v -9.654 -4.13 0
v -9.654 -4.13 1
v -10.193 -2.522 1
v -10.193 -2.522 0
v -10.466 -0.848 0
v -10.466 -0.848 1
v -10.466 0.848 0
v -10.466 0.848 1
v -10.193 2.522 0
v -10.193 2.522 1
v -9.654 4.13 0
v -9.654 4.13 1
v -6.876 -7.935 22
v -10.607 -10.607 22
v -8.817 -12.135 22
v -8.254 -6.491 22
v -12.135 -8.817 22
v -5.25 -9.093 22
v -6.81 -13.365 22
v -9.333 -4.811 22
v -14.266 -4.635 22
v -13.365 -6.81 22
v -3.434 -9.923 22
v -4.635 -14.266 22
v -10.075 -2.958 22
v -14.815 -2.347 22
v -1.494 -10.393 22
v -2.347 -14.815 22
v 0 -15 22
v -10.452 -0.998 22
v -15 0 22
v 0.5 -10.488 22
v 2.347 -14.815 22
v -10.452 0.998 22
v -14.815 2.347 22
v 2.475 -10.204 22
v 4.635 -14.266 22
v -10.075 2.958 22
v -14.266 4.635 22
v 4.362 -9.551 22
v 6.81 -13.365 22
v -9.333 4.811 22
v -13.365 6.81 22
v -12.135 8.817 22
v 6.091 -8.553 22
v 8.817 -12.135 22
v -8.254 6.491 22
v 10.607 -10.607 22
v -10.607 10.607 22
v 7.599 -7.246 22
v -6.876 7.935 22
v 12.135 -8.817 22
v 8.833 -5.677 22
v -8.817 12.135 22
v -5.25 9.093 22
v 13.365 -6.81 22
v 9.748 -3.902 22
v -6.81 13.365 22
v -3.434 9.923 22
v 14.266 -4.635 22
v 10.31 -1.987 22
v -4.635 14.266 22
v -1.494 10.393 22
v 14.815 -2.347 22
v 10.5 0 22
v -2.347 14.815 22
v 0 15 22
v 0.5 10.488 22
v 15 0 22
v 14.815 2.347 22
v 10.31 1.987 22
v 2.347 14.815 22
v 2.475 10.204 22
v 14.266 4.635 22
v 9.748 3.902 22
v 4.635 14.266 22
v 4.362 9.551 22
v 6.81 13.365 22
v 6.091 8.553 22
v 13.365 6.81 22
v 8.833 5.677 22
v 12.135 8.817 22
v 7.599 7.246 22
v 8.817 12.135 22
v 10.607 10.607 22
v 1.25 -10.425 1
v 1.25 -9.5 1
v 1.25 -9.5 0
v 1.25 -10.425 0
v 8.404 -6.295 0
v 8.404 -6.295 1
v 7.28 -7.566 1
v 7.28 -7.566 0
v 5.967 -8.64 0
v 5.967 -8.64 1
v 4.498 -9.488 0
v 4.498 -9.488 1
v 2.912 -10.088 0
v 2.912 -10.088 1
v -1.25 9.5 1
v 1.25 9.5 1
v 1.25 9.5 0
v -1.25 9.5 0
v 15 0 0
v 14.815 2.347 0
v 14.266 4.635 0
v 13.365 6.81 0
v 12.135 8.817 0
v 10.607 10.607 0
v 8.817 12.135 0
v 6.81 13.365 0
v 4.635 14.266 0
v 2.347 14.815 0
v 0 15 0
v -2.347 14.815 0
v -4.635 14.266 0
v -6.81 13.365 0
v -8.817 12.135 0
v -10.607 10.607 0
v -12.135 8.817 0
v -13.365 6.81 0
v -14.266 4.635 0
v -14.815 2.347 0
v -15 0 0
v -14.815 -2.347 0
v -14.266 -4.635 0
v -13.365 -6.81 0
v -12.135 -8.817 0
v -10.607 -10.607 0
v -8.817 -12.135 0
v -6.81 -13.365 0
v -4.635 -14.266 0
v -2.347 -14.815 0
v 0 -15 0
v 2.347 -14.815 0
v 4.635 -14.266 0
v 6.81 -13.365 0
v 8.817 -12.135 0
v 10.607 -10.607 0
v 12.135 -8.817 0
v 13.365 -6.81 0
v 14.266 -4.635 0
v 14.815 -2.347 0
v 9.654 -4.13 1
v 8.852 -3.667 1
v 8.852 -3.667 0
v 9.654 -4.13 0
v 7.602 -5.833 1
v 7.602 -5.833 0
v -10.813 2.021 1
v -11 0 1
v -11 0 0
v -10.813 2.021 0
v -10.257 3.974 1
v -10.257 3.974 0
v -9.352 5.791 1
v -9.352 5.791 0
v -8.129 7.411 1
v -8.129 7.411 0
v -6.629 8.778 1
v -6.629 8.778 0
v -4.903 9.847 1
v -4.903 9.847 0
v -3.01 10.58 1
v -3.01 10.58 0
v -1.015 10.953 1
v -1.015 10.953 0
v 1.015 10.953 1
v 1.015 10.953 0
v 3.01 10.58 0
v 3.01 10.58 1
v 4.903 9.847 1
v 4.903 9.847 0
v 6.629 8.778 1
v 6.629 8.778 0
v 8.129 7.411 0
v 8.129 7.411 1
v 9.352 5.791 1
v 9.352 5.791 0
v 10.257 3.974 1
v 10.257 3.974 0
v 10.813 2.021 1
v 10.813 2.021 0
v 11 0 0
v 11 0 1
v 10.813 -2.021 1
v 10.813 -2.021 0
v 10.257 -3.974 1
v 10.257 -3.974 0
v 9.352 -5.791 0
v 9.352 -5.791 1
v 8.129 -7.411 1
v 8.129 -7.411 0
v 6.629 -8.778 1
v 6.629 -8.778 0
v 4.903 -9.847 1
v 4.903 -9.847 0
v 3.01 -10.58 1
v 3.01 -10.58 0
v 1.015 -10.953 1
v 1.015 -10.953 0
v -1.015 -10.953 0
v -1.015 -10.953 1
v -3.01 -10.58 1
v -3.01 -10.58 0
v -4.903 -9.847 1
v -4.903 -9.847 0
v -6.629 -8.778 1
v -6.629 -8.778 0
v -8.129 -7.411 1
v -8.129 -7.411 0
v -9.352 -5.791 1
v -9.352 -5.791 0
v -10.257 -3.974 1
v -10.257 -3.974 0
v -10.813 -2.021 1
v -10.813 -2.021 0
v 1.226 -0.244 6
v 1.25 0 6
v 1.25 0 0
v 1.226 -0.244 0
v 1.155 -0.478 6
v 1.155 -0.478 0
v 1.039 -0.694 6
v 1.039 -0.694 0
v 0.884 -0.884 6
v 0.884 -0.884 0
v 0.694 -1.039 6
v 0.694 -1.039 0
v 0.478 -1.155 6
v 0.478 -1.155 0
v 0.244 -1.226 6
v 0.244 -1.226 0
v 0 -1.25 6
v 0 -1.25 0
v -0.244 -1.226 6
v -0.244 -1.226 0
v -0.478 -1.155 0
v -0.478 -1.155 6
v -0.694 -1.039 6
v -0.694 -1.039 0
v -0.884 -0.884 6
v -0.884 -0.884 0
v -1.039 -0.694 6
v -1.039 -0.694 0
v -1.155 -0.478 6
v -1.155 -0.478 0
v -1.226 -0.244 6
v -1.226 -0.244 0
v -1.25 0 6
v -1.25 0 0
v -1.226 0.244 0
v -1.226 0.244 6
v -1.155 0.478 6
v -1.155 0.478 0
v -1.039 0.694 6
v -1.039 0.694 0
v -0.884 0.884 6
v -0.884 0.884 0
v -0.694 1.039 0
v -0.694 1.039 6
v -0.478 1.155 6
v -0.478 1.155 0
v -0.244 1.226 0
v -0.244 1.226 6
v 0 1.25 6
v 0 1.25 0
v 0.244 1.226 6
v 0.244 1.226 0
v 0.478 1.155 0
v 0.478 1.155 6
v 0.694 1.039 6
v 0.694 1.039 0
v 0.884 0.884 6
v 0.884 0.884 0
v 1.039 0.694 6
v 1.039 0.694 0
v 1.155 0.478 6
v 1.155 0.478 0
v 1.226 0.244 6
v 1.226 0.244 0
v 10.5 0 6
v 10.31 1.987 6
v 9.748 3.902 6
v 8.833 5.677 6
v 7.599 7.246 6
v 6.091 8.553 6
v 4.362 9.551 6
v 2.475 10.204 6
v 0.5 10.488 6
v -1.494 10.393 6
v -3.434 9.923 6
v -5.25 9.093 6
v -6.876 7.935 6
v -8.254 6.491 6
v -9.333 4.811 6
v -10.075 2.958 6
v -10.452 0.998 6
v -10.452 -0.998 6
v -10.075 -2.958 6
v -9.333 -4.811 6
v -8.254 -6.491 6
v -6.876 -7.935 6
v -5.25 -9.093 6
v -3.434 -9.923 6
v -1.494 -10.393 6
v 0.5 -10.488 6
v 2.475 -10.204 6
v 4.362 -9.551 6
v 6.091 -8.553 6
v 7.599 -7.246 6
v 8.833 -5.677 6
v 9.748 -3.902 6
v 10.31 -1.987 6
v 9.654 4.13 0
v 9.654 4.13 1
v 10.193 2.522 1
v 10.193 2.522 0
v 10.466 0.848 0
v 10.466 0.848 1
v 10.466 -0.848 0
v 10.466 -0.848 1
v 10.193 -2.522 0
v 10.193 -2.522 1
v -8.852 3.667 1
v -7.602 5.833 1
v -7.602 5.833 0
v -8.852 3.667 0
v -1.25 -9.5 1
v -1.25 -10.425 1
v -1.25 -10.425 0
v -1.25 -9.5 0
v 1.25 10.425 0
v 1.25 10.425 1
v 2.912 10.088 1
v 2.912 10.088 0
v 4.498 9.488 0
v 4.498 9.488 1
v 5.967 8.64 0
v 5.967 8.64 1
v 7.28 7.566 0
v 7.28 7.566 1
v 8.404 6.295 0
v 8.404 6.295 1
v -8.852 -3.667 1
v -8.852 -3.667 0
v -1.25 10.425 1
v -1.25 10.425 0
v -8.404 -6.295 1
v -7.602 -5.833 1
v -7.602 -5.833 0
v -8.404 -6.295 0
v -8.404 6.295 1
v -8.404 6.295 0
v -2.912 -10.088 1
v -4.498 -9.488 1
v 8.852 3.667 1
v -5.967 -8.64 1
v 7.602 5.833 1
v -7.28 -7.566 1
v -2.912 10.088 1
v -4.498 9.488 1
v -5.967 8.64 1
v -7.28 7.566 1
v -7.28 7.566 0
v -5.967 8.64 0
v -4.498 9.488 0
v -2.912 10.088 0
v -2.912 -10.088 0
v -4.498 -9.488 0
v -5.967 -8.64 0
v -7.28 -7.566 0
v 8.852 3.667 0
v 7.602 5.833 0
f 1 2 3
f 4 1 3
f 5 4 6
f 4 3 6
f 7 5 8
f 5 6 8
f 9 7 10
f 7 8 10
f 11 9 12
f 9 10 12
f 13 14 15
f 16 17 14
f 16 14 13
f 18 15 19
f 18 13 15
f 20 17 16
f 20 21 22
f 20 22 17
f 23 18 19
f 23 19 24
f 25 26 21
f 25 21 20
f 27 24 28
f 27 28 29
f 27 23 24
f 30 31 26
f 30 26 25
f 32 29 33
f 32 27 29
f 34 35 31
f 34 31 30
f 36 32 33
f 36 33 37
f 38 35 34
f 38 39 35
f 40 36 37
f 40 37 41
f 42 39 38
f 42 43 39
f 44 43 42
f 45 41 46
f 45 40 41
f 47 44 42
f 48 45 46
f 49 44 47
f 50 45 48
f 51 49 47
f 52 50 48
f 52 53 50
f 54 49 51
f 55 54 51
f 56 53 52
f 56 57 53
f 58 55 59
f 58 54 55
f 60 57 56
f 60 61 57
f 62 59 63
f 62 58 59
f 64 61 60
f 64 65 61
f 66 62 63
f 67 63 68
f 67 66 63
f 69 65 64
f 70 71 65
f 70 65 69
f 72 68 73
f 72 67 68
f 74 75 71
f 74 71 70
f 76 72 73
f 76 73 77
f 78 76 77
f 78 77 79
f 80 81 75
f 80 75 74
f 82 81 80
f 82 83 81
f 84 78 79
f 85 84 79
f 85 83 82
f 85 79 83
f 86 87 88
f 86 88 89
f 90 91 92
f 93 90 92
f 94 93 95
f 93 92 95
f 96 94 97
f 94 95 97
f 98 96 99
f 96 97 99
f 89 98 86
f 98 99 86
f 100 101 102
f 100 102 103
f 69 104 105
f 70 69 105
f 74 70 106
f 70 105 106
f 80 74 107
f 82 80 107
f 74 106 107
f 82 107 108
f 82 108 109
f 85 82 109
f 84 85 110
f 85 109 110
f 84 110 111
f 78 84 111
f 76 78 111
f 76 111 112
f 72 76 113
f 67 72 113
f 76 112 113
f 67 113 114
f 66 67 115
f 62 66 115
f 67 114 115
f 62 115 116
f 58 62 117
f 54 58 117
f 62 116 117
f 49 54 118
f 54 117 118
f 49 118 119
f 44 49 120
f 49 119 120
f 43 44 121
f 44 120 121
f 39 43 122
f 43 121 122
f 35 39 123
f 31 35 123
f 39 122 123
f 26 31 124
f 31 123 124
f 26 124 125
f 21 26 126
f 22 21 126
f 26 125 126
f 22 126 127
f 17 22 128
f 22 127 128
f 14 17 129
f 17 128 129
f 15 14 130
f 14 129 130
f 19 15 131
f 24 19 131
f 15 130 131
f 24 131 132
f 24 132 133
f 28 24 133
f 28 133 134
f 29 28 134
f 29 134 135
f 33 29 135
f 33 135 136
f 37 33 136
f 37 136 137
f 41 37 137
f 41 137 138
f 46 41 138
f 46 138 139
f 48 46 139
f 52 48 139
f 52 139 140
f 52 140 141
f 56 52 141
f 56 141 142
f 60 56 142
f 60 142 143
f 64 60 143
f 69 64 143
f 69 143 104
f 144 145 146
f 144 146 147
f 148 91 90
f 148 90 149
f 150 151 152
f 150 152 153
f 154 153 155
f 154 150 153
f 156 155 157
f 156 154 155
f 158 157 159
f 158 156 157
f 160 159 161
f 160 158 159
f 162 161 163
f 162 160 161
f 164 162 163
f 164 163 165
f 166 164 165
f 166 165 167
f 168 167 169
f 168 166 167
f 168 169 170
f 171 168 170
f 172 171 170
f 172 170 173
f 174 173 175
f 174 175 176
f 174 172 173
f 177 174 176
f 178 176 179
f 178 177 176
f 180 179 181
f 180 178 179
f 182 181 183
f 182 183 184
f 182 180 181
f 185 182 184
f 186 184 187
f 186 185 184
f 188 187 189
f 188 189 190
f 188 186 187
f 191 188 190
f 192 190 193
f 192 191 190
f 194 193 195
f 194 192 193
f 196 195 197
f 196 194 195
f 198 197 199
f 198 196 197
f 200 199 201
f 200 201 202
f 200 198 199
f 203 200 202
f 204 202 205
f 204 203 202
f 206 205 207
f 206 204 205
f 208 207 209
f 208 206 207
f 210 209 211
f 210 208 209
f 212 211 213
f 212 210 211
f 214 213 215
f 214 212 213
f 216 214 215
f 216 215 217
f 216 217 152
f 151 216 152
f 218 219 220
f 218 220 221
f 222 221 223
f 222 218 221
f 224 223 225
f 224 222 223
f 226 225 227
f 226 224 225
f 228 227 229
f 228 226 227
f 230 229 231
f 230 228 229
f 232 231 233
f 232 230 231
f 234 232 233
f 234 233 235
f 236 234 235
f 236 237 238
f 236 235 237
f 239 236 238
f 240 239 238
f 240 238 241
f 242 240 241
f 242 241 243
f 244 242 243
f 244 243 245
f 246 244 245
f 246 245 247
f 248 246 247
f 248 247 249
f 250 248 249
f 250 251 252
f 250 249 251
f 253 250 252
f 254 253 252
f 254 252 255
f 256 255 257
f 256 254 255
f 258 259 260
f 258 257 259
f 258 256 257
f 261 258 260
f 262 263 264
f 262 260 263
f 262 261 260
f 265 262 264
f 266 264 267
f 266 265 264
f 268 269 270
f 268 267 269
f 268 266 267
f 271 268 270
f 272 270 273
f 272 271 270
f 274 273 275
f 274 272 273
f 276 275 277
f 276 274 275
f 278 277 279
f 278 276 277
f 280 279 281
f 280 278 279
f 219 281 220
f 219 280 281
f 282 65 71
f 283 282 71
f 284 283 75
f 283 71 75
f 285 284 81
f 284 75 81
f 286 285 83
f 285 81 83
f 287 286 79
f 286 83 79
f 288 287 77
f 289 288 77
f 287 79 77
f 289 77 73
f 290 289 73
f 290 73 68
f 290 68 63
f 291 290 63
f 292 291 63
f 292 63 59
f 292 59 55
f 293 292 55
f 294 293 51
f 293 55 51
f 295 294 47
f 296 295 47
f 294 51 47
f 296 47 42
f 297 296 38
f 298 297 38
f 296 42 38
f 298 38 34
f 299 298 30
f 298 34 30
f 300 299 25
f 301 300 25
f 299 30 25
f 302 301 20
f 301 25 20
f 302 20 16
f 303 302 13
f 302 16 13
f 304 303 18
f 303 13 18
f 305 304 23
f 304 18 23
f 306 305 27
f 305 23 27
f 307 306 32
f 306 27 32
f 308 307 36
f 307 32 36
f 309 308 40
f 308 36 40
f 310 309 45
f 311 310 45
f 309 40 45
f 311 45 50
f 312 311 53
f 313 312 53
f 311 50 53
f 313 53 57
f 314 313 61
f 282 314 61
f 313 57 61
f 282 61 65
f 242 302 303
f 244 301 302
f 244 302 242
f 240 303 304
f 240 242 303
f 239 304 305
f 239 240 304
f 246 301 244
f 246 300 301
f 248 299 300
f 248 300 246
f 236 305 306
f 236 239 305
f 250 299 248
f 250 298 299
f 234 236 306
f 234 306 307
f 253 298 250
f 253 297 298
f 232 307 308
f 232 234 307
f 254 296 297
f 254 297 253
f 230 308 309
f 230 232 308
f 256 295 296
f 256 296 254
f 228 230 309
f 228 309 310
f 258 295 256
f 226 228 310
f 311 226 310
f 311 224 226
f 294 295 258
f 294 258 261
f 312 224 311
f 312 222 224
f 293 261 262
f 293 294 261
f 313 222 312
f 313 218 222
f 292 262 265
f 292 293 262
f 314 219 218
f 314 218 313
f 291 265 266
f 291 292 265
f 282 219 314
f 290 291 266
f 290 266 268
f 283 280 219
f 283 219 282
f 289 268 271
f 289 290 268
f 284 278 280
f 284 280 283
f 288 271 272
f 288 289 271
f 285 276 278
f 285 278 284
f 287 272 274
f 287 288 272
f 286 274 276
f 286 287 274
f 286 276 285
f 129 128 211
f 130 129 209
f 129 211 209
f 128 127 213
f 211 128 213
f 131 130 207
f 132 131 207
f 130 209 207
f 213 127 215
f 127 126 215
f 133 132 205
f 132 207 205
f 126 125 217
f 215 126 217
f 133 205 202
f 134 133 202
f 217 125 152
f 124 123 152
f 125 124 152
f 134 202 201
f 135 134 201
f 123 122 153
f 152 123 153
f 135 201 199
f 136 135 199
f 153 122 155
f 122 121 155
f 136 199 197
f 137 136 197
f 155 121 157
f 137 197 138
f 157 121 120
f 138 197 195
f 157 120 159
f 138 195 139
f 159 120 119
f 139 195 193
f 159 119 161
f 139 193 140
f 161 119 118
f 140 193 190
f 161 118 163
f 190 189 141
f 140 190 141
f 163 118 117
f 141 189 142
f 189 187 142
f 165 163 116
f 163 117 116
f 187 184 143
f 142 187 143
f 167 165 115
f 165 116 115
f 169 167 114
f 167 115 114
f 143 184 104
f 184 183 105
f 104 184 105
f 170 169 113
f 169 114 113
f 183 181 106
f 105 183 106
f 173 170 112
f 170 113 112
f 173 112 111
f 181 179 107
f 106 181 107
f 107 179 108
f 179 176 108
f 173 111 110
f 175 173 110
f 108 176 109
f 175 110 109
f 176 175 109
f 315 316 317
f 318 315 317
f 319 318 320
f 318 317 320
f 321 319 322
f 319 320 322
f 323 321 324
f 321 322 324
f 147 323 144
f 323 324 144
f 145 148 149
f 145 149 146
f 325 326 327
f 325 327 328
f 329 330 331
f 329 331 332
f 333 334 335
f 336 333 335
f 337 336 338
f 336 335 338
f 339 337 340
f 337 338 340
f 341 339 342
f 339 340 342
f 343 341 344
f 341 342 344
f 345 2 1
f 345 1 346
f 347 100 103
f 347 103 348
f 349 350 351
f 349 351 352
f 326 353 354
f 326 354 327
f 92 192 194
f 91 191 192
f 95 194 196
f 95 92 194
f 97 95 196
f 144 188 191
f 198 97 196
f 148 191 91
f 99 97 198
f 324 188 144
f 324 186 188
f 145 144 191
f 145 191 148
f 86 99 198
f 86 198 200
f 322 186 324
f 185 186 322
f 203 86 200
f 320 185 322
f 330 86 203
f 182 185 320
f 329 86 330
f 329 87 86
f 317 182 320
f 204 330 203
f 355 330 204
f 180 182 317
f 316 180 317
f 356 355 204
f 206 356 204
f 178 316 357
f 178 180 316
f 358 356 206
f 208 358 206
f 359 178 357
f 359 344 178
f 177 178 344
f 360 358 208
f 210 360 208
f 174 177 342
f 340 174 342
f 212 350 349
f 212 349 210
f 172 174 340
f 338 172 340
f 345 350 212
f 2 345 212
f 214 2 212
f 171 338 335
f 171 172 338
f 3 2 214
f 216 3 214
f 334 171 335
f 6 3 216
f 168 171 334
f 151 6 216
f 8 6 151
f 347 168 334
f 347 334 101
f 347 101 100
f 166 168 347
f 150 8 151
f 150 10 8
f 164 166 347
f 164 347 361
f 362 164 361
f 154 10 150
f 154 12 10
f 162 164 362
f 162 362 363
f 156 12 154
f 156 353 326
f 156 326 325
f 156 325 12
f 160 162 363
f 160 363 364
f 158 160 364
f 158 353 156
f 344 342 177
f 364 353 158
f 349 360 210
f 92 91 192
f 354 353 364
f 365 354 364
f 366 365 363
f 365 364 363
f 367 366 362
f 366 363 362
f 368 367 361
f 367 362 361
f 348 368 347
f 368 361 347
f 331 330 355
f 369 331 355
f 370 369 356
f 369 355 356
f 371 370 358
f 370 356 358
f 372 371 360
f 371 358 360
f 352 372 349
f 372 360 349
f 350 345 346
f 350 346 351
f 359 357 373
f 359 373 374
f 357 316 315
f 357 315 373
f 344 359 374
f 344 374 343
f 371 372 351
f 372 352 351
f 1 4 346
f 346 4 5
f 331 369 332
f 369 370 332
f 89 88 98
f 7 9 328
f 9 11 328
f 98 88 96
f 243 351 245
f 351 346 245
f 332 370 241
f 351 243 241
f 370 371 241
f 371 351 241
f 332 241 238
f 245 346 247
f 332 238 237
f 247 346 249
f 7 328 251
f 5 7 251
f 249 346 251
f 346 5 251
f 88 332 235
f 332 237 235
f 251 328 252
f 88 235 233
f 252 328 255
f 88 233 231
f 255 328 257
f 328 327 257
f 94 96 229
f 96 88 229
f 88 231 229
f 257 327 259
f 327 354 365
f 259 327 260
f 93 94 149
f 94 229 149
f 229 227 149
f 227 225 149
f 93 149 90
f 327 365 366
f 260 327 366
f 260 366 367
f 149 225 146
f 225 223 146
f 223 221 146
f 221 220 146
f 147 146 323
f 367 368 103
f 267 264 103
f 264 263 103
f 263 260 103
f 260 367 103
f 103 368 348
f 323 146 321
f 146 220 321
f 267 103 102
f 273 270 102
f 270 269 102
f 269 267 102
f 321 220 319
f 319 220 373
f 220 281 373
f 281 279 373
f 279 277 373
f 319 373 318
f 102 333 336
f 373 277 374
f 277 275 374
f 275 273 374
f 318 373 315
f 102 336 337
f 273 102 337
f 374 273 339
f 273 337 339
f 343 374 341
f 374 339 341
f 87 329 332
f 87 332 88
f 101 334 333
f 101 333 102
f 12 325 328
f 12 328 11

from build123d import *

# Parameters (mm, degrees)
CROQUIS1_R                 = 15
SALIENTE_EXTRUIR1_DEPTH    = 22
CROQUIS2_R                 = 10.5
CORTAR_EXTRUIR1_DEPTH      = 16
CORTAR_EXTRUIR2_START      = -1
CORTAR_EXTRUIR2_DEPTH      = 1
CORTAR_EXTRUIR3_START      = -1
CROQUIS5_R                 = 11
CROQUIS5_R_2               = 10.5
CORTAR_EXTRUIR3_DEPTH      = 1
CORTAR_EXTRUIR4_DEPTH      = 31.56141358
CORTAR_EXTRUIR4_DEPTH_BACK = 31.56141358
CROQUIS6_R                 = 1.25


with BuildPart() as part:
    # Croquis1 → Saliente-Extruir1 (new body)
    with BuildSketch(Plane.XY):
        Circle(CROQUIS1_R)
    extrude(amount=SALIENTE_EXTRUIR1_DEPTH)

    # Croquis2 → Cortar-Extruir1 (cut)
    with BuildSketch(Plane.XY.offset(22)):
        Circle(CROQUIS2_R)
    extrude(amount=-CORTAR_EXTRUIR1_DEPTH, mode=Mode.SUBTRACT)

    # Croquis3 → Cortar-Extruir2 (cut)
    with BuildSketch(Plane(origin=(0, 0, 0), x_dir=(-1, 0, 0), z_dir=(0, 0, -1)).offset(CORTAR_EXTRUIR2_START)):
        with BuildLine():
            ThreePointArc((1.25, 10.425329731), (0, 10.5), (-1.25, 10.425329731))
            Line((-1.25, 10.425329731), (-1.25, 9.5))
            Line((-1.25, 9.5), (1.25, 9.5))
            Line((1.25, 9.5), (1.25, 10.425329731))
        make_face()
        with BuildLine():
            Line((-7.602241336, 5.832531755), (-8.40360039, 6.29519662))
            ThreePointArc((-8.40360039, 6.29519662), (-9.09326674, 5.25), (-9.65360039, 4.130133111))
            Line((-9.65360039, 4.130133111), (-8.852241336, 3.667468245))
            Line((-8.852241336, 3.667468245), (-7.602241336, 5.832531755))
        make_face()
        with BuildLine():
            ThreePointArc((9.65360039, 4.130133111), (9.09326674, 5.25), (8.40360039, 6.29519662))
            Line((8.40360039, 6.29519662), (7.602241336, 5.832531755))
            Line((7.602241336, 5.832531755), (8.852241336, 3.667468245))
            Line((8.852241336, 3.667468245), (9.65360039, 4.130133111))
        make_face()
        with BuildLine():
            Line((-8.852241336, -3.667468245), (-9.65360039, -4.130133111))
            ThreePointArc((-9.65360039, -4.130133111), (-9.09326674, -5.25), (-8.40360039, -6.29519662))
            Line((-8.40360039, -6.29519662), (-7.602241336, -5.832531755))
            Line((-7.602241336, -5.832531755), (-8.852241336, -3.667468245))
        make_face()
        with BuildLine():
            ThreePointArc((8.40360039, -6.29519662), (9.09326674, -5.25), (9.65360039, -4.130133111))
            Line((9.65360039, -4.130133111), (8.852241336, -3.667468245))
            Line((8.852241336, -3.667468245), (7.602241336, -5.832531755))
            Line((7.602241336, -5.832531755), (8.40360039, -6.29519662))
        make_face()
        with BuildLine():
            Line((-1.25, -9.5), (-1.25, -10.425329731))
            ThreePointArc((-1.25, -10.425329731), (0, -10.5), (1.25, -10.425329731))
            Line((1.25, -10.425329731), (1.25, -9.5))
            Line((1.25, -9.5), (-1.25, -9.5))
        make_face()
    extrude(amount=CORTAR_EXTRUIR2_DEPTH, mode=Mode.SUBTRACT)

    # Croquis5 → Cortar-Extruir3 (cut)
    with BuildSketch(Plane(origin=(0, 0, 0), x_dir=(-1, 0, 0), z_dir=(0, 0, -1)).offset(CORTAR_EXTRUIR3_START)):
        Circle(CROQUIS5_R)
        Circle(CROQUIS5_R_2, mode=Mode.SUBTRACT)
    extrude(amount=CORTAR_EXTRUIR3_DEPTH, mode=Mode.SUBTRACT)

    # Croquis6 → Cortar-Extruir4 (cut, two sides: drawn at the far end of the back side and taken through both)
    with BuildSketch(Plane(origin=(0, 0, 0), x_dir=(-1, 0, 0), z_dir=(0, 0, -1)).offset(-CORTAR_EXTRUIR4_DEPTH_BACK)):
        Circle(CROQUIS6_R)
    extrude(amount=CORTAR_EXTRUIR4_DEPTH + CORTAR_EXTRUIR4_DEPTH_BACK, mode=Mode.SUBTRACT)


solid = part.part
